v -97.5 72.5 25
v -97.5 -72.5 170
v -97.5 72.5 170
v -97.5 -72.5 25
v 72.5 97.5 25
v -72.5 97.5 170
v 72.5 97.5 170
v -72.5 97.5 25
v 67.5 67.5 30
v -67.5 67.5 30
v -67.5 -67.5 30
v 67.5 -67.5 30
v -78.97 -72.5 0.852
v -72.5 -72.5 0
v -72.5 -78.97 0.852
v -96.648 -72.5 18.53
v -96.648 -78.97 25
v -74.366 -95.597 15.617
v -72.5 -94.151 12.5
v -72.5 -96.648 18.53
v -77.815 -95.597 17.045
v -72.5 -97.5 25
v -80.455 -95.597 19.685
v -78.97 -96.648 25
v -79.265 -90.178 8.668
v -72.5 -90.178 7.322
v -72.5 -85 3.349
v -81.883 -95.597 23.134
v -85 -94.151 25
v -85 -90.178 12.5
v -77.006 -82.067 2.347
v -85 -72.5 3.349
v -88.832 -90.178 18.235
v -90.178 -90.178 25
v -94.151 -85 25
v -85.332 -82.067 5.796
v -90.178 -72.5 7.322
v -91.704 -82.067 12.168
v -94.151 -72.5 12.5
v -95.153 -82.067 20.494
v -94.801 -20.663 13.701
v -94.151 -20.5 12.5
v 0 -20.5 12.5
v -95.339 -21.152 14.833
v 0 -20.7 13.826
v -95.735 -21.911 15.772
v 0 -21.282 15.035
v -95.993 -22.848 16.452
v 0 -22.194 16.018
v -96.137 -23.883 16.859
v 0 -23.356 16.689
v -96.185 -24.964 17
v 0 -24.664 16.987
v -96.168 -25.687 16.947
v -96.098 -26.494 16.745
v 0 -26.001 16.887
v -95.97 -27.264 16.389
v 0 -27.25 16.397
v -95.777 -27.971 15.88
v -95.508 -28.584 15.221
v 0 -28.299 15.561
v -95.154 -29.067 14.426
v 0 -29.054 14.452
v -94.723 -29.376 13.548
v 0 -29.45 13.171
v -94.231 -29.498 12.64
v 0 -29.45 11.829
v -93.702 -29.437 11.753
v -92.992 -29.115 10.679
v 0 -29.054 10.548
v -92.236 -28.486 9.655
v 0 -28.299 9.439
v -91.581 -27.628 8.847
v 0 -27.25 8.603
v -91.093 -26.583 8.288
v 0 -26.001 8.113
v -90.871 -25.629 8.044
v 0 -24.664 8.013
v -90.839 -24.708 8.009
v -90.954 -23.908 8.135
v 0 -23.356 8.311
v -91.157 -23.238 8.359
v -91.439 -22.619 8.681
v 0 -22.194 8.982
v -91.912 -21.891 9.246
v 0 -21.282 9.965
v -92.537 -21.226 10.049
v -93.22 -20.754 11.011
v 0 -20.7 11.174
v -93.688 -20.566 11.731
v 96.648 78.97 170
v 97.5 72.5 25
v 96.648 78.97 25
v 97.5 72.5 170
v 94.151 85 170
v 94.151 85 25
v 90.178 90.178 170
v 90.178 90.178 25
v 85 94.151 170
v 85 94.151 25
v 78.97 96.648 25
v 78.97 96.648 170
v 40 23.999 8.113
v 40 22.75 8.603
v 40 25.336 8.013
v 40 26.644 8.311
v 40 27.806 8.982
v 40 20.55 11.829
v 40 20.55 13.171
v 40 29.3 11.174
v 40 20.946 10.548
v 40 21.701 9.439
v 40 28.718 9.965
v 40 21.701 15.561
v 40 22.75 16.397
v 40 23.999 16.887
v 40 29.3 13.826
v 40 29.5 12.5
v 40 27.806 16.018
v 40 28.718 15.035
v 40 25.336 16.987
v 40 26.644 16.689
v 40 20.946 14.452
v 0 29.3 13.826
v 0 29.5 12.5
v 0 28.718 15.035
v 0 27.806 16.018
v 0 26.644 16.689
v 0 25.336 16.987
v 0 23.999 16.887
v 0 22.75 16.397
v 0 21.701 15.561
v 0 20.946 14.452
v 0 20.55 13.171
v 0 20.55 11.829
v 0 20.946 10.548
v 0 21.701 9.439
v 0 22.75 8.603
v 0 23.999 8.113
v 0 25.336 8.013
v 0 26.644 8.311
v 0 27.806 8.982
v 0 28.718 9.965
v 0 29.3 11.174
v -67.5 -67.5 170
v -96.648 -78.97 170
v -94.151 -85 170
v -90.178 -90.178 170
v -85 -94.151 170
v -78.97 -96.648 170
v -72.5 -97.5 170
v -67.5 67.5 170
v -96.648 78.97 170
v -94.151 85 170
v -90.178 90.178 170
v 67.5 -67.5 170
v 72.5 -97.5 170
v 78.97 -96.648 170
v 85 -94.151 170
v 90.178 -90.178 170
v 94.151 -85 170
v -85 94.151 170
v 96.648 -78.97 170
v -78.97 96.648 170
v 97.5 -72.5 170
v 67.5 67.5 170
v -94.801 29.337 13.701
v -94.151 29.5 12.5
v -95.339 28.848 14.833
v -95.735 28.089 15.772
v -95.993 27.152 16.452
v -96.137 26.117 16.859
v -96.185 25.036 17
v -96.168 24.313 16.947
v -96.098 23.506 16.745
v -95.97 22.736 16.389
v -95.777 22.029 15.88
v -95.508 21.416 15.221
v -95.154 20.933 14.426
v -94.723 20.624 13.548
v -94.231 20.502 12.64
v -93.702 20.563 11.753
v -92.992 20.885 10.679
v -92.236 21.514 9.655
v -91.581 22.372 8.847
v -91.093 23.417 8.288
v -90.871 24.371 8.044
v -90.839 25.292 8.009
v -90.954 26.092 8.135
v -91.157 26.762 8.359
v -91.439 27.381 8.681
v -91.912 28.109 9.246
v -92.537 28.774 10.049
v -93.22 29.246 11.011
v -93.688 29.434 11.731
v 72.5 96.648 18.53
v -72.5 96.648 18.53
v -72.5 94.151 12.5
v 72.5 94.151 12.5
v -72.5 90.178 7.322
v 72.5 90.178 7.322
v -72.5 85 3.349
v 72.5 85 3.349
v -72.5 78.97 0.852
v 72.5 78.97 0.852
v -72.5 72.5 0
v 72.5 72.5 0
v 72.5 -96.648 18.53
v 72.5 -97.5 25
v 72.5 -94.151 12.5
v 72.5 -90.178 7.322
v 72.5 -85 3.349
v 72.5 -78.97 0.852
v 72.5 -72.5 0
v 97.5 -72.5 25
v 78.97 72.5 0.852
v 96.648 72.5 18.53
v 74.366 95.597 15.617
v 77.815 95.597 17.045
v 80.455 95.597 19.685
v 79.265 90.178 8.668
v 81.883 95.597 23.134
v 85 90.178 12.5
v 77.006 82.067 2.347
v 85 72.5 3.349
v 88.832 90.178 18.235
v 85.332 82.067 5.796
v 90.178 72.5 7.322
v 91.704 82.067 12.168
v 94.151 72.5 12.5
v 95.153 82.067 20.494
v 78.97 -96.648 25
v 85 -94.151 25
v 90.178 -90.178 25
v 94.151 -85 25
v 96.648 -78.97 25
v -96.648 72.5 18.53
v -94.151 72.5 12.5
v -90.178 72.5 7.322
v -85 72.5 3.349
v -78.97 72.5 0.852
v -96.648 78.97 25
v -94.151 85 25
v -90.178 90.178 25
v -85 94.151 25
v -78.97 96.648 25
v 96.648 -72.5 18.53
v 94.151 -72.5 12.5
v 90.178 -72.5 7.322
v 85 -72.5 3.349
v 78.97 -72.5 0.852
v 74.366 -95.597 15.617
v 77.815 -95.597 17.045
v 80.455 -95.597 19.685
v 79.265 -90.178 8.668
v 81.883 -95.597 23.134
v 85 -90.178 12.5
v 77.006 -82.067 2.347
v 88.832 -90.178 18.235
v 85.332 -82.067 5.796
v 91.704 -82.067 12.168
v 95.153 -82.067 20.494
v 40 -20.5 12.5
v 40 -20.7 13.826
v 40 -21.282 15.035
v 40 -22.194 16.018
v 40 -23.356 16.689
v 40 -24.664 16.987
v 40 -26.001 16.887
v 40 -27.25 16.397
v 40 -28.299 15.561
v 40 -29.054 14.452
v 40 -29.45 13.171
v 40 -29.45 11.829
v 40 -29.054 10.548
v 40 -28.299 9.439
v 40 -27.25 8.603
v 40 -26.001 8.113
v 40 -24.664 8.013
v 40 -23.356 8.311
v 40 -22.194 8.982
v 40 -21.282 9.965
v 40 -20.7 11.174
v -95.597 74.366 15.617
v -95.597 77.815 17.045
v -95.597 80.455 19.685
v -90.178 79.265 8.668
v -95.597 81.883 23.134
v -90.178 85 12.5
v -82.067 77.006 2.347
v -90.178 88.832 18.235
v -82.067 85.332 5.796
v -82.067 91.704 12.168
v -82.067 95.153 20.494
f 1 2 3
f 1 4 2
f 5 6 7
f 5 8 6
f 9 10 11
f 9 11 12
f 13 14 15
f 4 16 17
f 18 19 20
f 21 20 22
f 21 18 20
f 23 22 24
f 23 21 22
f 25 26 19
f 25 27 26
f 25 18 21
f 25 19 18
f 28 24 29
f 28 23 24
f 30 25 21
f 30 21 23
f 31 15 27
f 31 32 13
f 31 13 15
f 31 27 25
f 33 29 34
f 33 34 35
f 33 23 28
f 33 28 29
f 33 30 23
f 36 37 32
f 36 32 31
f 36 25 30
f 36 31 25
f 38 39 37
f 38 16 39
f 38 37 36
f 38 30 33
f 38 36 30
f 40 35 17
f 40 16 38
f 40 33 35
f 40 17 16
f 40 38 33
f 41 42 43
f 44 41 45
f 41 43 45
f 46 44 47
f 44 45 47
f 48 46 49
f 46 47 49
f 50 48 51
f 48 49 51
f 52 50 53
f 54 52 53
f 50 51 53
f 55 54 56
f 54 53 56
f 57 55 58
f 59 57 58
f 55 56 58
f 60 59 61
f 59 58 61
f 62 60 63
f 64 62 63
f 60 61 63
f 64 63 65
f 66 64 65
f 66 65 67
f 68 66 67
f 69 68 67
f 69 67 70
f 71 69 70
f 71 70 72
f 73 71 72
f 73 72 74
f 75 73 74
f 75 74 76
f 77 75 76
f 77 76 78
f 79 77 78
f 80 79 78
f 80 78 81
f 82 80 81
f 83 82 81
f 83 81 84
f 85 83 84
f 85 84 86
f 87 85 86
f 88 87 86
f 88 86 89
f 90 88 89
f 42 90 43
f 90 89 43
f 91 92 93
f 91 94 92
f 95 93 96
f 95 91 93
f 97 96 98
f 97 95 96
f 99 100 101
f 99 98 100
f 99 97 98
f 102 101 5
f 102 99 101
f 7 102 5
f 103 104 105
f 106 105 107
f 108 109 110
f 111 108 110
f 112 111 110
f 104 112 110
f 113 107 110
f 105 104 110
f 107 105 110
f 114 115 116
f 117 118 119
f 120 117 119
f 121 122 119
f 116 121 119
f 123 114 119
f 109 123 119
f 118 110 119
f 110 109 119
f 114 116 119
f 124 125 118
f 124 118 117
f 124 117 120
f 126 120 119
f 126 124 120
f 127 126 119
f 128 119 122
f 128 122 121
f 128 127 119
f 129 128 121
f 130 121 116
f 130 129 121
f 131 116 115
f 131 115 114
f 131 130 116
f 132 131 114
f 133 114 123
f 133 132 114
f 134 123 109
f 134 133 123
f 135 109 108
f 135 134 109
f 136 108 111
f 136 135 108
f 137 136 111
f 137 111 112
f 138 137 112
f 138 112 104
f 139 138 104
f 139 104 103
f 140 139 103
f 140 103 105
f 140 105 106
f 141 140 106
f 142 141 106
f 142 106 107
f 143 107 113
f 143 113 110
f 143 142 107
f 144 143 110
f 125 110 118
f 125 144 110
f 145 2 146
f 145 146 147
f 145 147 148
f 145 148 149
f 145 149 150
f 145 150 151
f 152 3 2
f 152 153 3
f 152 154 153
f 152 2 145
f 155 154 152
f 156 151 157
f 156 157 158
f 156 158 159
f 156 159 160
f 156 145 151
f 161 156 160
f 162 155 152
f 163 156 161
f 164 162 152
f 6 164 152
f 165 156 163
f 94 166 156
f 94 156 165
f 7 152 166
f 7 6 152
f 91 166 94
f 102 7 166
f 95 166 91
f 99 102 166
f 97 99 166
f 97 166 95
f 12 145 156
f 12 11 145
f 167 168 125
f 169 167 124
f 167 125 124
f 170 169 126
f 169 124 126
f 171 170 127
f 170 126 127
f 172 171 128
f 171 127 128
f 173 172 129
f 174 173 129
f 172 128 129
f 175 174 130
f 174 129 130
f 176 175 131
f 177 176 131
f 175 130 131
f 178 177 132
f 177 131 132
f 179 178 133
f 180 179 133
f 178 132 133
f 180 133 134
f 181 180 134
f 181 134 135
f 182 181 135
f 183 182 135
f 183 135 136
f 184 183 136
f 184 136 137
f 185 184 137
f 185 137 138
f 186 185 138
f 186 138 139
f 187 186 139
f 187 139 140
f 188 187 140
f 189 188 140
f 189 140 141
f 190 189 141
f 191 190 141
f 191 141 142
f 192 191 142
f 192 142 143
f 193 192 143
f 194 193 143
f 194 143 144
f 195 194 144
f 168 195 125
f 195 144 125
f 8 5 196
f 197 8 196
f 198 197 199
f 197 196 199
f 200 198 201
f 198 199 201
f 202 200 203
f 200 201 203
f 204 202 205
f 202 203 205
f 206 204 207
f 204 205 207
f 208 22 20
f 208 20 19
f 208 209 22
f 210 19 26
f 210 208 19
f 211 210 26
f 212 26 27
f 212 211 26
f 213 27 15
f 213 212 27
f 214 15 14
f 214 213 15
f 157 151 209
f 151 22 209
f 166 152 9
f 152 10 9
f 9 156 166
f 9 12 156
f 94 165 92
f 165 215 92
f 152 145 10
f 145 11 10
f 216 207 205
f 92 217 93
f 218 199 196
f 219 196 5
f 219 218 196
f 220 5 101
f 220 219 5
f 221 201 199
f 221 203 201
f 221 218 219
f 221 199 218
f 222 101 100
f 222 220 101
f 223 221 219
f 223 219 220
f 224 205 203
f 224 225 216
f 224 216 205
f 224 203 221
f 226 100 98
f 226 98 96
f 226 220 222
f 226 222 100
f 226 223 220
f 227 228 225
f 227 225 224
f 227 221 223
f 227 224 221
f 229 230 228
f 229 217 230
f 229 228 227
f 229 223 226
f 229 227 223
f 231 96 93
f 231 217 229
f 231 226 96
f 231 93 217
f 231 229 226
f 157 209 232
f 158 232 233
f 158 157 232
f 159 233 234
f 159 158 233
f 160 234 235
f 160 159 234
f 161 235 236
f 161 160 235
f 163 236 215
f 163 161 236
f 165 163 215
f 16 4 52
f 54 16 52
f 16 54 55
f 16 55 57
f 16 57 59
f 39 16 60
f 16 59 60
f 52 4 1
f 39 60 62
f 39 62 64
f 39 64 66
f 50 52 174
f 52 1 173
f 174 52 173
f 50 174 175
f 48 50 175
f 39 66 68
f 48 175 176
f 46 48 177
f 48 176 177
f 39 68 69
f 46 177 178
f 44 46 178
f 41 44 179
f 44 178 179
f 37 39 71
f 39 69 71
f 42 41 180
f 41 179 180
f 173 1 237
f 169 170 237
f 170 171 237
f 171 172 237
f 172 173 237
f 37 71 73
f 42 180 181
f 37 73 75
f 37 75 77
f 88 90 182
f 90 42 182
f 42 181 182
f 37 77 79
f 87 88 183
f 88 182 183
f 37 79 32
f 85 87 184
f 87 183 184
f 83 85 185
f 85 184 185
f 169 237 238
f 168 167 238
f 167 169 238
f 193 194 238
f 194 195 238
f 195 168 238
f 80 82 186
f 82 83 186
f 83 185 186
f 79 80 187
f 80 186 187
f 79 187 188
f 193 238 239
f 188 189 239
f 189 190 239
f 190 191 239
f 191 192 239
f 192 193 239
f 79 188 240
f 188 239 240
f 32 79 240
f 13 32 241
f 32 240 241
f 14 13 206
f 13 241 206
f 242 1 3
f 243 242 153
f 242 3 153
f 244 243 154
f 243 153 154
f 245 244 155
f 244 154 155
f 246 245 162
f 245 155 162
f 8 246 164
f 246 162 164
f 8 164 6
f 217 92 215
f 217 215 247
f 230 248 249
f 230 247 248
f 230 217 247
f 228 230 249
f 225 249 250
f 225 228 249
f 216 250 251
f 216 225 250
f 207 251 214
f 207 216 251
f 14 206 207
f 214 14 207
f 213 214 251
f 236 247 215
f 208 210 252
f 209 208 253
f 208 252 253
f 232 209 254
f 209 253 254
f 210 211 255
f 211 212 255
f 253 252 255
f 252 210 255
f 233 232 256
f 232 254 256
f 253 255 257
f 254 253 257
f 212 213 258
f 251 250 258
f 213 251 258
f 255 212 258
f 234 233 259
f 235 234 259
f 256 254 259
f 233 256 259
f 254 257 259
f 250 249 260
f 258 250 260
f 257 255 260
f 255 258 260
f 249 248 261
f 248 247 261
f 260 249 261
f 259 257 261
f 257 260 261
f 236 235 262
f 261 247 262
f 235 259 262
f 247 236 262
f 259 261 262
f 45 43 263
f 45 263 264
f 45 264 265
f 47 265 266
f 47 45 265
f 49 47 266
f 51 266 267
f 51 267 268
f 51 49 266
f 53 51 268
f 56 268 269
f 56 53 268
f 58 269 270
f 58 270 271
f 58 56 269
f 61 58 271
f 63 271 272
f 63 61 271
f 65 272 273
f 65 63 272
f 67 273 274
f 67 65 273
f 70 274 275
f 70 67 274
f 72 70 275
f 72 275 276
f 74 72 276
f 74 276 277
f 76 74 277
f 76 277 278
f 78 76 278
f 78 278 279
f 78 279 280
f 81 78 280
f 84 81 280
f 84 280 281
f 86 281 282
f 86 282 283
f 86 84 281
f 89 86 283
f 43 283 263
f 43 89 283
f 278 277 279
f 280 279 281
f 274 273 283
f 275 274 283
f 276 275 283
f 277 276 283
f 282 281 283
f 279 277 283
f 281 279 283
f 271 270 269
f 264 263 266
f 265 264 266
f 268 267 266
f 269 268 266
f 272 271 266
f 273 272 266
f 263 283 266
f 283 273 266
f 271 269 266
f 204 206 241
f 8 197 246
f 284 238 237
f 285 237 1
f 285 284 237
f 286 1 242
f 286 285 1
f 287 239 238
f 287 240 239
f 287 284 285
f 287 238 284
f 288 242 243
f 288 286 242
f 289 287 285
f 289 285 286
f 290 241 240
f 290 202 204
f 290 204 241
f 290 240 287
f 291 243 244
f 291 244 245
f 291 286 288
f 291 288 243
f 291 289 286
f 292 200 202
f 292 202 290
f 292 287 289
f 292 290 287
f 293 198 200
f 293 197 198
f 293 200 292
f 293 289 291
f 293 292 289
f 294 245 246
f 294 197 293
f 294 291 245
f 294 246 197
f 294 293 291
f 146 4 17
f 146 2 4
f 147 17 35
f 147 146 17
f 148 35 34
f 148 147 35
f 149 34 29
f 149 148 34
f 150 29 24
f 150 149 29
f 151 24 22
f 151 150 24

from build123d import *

# Parameters (mm, degrees)
F0_W     = 195
F0_H     = 195
F1_DEPTH = 170
F3_R     = 25
F4_T     = -30
F2_R     = 4.5
F5_DEPTH = 195
F6_DEPTH = 40


with BuildPart() as f1:
    # F0 (on Top) → F1 (new body)
    with BuildSketch(Plane.XY):
        Rectangle(F0_W, F0_H)
    extrude(amount=F1_DEPTH)

    # F3
    f3_edges = [f1.edges().sort_by_distance(p)[0] for p in [
        (97.5, 0, 0),
        (0, 97.5, 0),
        (-97.5, 0, 0),
        (0, -97.5, 0),
        (97.5, 97.5, 85),
        (-97.5, 97.5, 85),
        (-97.5, -97.5, 85),
        (97.5, -97.5, 85),
    ]]
    fillet(f3_edges, radius=F3_R)

    # F4
    f4_openings = [f1.faces().sort_by_distance(p)[0] for p in [
        (0, 0, 170),
    ]]
    offset(amount=F4_T, openings=f4_openings)

    # F2 (on Right) → F5 (cut)
    with BuildSketch(Plane.YZ):
        with Locations((-25, 12.5)):
            Circle(F2_R)
        with Locations((25, 12.5)):
            Circle(F2_R)
    extrude(amount=-F5_DEPTH, mode=Mode.SUBTRACT)

    # F2 (on Right) → F6 (cut)
    with BuildSketch(Plane.YZ):
        with Locations((-25, 12.5)):
            Circle(F2_R)
        with Locations((25, 12.5)):
            Circle(F2_R)
    extrude(amount=F6_DEPTH, mode=Mode.SUBTRACT)


solid = f1.part
